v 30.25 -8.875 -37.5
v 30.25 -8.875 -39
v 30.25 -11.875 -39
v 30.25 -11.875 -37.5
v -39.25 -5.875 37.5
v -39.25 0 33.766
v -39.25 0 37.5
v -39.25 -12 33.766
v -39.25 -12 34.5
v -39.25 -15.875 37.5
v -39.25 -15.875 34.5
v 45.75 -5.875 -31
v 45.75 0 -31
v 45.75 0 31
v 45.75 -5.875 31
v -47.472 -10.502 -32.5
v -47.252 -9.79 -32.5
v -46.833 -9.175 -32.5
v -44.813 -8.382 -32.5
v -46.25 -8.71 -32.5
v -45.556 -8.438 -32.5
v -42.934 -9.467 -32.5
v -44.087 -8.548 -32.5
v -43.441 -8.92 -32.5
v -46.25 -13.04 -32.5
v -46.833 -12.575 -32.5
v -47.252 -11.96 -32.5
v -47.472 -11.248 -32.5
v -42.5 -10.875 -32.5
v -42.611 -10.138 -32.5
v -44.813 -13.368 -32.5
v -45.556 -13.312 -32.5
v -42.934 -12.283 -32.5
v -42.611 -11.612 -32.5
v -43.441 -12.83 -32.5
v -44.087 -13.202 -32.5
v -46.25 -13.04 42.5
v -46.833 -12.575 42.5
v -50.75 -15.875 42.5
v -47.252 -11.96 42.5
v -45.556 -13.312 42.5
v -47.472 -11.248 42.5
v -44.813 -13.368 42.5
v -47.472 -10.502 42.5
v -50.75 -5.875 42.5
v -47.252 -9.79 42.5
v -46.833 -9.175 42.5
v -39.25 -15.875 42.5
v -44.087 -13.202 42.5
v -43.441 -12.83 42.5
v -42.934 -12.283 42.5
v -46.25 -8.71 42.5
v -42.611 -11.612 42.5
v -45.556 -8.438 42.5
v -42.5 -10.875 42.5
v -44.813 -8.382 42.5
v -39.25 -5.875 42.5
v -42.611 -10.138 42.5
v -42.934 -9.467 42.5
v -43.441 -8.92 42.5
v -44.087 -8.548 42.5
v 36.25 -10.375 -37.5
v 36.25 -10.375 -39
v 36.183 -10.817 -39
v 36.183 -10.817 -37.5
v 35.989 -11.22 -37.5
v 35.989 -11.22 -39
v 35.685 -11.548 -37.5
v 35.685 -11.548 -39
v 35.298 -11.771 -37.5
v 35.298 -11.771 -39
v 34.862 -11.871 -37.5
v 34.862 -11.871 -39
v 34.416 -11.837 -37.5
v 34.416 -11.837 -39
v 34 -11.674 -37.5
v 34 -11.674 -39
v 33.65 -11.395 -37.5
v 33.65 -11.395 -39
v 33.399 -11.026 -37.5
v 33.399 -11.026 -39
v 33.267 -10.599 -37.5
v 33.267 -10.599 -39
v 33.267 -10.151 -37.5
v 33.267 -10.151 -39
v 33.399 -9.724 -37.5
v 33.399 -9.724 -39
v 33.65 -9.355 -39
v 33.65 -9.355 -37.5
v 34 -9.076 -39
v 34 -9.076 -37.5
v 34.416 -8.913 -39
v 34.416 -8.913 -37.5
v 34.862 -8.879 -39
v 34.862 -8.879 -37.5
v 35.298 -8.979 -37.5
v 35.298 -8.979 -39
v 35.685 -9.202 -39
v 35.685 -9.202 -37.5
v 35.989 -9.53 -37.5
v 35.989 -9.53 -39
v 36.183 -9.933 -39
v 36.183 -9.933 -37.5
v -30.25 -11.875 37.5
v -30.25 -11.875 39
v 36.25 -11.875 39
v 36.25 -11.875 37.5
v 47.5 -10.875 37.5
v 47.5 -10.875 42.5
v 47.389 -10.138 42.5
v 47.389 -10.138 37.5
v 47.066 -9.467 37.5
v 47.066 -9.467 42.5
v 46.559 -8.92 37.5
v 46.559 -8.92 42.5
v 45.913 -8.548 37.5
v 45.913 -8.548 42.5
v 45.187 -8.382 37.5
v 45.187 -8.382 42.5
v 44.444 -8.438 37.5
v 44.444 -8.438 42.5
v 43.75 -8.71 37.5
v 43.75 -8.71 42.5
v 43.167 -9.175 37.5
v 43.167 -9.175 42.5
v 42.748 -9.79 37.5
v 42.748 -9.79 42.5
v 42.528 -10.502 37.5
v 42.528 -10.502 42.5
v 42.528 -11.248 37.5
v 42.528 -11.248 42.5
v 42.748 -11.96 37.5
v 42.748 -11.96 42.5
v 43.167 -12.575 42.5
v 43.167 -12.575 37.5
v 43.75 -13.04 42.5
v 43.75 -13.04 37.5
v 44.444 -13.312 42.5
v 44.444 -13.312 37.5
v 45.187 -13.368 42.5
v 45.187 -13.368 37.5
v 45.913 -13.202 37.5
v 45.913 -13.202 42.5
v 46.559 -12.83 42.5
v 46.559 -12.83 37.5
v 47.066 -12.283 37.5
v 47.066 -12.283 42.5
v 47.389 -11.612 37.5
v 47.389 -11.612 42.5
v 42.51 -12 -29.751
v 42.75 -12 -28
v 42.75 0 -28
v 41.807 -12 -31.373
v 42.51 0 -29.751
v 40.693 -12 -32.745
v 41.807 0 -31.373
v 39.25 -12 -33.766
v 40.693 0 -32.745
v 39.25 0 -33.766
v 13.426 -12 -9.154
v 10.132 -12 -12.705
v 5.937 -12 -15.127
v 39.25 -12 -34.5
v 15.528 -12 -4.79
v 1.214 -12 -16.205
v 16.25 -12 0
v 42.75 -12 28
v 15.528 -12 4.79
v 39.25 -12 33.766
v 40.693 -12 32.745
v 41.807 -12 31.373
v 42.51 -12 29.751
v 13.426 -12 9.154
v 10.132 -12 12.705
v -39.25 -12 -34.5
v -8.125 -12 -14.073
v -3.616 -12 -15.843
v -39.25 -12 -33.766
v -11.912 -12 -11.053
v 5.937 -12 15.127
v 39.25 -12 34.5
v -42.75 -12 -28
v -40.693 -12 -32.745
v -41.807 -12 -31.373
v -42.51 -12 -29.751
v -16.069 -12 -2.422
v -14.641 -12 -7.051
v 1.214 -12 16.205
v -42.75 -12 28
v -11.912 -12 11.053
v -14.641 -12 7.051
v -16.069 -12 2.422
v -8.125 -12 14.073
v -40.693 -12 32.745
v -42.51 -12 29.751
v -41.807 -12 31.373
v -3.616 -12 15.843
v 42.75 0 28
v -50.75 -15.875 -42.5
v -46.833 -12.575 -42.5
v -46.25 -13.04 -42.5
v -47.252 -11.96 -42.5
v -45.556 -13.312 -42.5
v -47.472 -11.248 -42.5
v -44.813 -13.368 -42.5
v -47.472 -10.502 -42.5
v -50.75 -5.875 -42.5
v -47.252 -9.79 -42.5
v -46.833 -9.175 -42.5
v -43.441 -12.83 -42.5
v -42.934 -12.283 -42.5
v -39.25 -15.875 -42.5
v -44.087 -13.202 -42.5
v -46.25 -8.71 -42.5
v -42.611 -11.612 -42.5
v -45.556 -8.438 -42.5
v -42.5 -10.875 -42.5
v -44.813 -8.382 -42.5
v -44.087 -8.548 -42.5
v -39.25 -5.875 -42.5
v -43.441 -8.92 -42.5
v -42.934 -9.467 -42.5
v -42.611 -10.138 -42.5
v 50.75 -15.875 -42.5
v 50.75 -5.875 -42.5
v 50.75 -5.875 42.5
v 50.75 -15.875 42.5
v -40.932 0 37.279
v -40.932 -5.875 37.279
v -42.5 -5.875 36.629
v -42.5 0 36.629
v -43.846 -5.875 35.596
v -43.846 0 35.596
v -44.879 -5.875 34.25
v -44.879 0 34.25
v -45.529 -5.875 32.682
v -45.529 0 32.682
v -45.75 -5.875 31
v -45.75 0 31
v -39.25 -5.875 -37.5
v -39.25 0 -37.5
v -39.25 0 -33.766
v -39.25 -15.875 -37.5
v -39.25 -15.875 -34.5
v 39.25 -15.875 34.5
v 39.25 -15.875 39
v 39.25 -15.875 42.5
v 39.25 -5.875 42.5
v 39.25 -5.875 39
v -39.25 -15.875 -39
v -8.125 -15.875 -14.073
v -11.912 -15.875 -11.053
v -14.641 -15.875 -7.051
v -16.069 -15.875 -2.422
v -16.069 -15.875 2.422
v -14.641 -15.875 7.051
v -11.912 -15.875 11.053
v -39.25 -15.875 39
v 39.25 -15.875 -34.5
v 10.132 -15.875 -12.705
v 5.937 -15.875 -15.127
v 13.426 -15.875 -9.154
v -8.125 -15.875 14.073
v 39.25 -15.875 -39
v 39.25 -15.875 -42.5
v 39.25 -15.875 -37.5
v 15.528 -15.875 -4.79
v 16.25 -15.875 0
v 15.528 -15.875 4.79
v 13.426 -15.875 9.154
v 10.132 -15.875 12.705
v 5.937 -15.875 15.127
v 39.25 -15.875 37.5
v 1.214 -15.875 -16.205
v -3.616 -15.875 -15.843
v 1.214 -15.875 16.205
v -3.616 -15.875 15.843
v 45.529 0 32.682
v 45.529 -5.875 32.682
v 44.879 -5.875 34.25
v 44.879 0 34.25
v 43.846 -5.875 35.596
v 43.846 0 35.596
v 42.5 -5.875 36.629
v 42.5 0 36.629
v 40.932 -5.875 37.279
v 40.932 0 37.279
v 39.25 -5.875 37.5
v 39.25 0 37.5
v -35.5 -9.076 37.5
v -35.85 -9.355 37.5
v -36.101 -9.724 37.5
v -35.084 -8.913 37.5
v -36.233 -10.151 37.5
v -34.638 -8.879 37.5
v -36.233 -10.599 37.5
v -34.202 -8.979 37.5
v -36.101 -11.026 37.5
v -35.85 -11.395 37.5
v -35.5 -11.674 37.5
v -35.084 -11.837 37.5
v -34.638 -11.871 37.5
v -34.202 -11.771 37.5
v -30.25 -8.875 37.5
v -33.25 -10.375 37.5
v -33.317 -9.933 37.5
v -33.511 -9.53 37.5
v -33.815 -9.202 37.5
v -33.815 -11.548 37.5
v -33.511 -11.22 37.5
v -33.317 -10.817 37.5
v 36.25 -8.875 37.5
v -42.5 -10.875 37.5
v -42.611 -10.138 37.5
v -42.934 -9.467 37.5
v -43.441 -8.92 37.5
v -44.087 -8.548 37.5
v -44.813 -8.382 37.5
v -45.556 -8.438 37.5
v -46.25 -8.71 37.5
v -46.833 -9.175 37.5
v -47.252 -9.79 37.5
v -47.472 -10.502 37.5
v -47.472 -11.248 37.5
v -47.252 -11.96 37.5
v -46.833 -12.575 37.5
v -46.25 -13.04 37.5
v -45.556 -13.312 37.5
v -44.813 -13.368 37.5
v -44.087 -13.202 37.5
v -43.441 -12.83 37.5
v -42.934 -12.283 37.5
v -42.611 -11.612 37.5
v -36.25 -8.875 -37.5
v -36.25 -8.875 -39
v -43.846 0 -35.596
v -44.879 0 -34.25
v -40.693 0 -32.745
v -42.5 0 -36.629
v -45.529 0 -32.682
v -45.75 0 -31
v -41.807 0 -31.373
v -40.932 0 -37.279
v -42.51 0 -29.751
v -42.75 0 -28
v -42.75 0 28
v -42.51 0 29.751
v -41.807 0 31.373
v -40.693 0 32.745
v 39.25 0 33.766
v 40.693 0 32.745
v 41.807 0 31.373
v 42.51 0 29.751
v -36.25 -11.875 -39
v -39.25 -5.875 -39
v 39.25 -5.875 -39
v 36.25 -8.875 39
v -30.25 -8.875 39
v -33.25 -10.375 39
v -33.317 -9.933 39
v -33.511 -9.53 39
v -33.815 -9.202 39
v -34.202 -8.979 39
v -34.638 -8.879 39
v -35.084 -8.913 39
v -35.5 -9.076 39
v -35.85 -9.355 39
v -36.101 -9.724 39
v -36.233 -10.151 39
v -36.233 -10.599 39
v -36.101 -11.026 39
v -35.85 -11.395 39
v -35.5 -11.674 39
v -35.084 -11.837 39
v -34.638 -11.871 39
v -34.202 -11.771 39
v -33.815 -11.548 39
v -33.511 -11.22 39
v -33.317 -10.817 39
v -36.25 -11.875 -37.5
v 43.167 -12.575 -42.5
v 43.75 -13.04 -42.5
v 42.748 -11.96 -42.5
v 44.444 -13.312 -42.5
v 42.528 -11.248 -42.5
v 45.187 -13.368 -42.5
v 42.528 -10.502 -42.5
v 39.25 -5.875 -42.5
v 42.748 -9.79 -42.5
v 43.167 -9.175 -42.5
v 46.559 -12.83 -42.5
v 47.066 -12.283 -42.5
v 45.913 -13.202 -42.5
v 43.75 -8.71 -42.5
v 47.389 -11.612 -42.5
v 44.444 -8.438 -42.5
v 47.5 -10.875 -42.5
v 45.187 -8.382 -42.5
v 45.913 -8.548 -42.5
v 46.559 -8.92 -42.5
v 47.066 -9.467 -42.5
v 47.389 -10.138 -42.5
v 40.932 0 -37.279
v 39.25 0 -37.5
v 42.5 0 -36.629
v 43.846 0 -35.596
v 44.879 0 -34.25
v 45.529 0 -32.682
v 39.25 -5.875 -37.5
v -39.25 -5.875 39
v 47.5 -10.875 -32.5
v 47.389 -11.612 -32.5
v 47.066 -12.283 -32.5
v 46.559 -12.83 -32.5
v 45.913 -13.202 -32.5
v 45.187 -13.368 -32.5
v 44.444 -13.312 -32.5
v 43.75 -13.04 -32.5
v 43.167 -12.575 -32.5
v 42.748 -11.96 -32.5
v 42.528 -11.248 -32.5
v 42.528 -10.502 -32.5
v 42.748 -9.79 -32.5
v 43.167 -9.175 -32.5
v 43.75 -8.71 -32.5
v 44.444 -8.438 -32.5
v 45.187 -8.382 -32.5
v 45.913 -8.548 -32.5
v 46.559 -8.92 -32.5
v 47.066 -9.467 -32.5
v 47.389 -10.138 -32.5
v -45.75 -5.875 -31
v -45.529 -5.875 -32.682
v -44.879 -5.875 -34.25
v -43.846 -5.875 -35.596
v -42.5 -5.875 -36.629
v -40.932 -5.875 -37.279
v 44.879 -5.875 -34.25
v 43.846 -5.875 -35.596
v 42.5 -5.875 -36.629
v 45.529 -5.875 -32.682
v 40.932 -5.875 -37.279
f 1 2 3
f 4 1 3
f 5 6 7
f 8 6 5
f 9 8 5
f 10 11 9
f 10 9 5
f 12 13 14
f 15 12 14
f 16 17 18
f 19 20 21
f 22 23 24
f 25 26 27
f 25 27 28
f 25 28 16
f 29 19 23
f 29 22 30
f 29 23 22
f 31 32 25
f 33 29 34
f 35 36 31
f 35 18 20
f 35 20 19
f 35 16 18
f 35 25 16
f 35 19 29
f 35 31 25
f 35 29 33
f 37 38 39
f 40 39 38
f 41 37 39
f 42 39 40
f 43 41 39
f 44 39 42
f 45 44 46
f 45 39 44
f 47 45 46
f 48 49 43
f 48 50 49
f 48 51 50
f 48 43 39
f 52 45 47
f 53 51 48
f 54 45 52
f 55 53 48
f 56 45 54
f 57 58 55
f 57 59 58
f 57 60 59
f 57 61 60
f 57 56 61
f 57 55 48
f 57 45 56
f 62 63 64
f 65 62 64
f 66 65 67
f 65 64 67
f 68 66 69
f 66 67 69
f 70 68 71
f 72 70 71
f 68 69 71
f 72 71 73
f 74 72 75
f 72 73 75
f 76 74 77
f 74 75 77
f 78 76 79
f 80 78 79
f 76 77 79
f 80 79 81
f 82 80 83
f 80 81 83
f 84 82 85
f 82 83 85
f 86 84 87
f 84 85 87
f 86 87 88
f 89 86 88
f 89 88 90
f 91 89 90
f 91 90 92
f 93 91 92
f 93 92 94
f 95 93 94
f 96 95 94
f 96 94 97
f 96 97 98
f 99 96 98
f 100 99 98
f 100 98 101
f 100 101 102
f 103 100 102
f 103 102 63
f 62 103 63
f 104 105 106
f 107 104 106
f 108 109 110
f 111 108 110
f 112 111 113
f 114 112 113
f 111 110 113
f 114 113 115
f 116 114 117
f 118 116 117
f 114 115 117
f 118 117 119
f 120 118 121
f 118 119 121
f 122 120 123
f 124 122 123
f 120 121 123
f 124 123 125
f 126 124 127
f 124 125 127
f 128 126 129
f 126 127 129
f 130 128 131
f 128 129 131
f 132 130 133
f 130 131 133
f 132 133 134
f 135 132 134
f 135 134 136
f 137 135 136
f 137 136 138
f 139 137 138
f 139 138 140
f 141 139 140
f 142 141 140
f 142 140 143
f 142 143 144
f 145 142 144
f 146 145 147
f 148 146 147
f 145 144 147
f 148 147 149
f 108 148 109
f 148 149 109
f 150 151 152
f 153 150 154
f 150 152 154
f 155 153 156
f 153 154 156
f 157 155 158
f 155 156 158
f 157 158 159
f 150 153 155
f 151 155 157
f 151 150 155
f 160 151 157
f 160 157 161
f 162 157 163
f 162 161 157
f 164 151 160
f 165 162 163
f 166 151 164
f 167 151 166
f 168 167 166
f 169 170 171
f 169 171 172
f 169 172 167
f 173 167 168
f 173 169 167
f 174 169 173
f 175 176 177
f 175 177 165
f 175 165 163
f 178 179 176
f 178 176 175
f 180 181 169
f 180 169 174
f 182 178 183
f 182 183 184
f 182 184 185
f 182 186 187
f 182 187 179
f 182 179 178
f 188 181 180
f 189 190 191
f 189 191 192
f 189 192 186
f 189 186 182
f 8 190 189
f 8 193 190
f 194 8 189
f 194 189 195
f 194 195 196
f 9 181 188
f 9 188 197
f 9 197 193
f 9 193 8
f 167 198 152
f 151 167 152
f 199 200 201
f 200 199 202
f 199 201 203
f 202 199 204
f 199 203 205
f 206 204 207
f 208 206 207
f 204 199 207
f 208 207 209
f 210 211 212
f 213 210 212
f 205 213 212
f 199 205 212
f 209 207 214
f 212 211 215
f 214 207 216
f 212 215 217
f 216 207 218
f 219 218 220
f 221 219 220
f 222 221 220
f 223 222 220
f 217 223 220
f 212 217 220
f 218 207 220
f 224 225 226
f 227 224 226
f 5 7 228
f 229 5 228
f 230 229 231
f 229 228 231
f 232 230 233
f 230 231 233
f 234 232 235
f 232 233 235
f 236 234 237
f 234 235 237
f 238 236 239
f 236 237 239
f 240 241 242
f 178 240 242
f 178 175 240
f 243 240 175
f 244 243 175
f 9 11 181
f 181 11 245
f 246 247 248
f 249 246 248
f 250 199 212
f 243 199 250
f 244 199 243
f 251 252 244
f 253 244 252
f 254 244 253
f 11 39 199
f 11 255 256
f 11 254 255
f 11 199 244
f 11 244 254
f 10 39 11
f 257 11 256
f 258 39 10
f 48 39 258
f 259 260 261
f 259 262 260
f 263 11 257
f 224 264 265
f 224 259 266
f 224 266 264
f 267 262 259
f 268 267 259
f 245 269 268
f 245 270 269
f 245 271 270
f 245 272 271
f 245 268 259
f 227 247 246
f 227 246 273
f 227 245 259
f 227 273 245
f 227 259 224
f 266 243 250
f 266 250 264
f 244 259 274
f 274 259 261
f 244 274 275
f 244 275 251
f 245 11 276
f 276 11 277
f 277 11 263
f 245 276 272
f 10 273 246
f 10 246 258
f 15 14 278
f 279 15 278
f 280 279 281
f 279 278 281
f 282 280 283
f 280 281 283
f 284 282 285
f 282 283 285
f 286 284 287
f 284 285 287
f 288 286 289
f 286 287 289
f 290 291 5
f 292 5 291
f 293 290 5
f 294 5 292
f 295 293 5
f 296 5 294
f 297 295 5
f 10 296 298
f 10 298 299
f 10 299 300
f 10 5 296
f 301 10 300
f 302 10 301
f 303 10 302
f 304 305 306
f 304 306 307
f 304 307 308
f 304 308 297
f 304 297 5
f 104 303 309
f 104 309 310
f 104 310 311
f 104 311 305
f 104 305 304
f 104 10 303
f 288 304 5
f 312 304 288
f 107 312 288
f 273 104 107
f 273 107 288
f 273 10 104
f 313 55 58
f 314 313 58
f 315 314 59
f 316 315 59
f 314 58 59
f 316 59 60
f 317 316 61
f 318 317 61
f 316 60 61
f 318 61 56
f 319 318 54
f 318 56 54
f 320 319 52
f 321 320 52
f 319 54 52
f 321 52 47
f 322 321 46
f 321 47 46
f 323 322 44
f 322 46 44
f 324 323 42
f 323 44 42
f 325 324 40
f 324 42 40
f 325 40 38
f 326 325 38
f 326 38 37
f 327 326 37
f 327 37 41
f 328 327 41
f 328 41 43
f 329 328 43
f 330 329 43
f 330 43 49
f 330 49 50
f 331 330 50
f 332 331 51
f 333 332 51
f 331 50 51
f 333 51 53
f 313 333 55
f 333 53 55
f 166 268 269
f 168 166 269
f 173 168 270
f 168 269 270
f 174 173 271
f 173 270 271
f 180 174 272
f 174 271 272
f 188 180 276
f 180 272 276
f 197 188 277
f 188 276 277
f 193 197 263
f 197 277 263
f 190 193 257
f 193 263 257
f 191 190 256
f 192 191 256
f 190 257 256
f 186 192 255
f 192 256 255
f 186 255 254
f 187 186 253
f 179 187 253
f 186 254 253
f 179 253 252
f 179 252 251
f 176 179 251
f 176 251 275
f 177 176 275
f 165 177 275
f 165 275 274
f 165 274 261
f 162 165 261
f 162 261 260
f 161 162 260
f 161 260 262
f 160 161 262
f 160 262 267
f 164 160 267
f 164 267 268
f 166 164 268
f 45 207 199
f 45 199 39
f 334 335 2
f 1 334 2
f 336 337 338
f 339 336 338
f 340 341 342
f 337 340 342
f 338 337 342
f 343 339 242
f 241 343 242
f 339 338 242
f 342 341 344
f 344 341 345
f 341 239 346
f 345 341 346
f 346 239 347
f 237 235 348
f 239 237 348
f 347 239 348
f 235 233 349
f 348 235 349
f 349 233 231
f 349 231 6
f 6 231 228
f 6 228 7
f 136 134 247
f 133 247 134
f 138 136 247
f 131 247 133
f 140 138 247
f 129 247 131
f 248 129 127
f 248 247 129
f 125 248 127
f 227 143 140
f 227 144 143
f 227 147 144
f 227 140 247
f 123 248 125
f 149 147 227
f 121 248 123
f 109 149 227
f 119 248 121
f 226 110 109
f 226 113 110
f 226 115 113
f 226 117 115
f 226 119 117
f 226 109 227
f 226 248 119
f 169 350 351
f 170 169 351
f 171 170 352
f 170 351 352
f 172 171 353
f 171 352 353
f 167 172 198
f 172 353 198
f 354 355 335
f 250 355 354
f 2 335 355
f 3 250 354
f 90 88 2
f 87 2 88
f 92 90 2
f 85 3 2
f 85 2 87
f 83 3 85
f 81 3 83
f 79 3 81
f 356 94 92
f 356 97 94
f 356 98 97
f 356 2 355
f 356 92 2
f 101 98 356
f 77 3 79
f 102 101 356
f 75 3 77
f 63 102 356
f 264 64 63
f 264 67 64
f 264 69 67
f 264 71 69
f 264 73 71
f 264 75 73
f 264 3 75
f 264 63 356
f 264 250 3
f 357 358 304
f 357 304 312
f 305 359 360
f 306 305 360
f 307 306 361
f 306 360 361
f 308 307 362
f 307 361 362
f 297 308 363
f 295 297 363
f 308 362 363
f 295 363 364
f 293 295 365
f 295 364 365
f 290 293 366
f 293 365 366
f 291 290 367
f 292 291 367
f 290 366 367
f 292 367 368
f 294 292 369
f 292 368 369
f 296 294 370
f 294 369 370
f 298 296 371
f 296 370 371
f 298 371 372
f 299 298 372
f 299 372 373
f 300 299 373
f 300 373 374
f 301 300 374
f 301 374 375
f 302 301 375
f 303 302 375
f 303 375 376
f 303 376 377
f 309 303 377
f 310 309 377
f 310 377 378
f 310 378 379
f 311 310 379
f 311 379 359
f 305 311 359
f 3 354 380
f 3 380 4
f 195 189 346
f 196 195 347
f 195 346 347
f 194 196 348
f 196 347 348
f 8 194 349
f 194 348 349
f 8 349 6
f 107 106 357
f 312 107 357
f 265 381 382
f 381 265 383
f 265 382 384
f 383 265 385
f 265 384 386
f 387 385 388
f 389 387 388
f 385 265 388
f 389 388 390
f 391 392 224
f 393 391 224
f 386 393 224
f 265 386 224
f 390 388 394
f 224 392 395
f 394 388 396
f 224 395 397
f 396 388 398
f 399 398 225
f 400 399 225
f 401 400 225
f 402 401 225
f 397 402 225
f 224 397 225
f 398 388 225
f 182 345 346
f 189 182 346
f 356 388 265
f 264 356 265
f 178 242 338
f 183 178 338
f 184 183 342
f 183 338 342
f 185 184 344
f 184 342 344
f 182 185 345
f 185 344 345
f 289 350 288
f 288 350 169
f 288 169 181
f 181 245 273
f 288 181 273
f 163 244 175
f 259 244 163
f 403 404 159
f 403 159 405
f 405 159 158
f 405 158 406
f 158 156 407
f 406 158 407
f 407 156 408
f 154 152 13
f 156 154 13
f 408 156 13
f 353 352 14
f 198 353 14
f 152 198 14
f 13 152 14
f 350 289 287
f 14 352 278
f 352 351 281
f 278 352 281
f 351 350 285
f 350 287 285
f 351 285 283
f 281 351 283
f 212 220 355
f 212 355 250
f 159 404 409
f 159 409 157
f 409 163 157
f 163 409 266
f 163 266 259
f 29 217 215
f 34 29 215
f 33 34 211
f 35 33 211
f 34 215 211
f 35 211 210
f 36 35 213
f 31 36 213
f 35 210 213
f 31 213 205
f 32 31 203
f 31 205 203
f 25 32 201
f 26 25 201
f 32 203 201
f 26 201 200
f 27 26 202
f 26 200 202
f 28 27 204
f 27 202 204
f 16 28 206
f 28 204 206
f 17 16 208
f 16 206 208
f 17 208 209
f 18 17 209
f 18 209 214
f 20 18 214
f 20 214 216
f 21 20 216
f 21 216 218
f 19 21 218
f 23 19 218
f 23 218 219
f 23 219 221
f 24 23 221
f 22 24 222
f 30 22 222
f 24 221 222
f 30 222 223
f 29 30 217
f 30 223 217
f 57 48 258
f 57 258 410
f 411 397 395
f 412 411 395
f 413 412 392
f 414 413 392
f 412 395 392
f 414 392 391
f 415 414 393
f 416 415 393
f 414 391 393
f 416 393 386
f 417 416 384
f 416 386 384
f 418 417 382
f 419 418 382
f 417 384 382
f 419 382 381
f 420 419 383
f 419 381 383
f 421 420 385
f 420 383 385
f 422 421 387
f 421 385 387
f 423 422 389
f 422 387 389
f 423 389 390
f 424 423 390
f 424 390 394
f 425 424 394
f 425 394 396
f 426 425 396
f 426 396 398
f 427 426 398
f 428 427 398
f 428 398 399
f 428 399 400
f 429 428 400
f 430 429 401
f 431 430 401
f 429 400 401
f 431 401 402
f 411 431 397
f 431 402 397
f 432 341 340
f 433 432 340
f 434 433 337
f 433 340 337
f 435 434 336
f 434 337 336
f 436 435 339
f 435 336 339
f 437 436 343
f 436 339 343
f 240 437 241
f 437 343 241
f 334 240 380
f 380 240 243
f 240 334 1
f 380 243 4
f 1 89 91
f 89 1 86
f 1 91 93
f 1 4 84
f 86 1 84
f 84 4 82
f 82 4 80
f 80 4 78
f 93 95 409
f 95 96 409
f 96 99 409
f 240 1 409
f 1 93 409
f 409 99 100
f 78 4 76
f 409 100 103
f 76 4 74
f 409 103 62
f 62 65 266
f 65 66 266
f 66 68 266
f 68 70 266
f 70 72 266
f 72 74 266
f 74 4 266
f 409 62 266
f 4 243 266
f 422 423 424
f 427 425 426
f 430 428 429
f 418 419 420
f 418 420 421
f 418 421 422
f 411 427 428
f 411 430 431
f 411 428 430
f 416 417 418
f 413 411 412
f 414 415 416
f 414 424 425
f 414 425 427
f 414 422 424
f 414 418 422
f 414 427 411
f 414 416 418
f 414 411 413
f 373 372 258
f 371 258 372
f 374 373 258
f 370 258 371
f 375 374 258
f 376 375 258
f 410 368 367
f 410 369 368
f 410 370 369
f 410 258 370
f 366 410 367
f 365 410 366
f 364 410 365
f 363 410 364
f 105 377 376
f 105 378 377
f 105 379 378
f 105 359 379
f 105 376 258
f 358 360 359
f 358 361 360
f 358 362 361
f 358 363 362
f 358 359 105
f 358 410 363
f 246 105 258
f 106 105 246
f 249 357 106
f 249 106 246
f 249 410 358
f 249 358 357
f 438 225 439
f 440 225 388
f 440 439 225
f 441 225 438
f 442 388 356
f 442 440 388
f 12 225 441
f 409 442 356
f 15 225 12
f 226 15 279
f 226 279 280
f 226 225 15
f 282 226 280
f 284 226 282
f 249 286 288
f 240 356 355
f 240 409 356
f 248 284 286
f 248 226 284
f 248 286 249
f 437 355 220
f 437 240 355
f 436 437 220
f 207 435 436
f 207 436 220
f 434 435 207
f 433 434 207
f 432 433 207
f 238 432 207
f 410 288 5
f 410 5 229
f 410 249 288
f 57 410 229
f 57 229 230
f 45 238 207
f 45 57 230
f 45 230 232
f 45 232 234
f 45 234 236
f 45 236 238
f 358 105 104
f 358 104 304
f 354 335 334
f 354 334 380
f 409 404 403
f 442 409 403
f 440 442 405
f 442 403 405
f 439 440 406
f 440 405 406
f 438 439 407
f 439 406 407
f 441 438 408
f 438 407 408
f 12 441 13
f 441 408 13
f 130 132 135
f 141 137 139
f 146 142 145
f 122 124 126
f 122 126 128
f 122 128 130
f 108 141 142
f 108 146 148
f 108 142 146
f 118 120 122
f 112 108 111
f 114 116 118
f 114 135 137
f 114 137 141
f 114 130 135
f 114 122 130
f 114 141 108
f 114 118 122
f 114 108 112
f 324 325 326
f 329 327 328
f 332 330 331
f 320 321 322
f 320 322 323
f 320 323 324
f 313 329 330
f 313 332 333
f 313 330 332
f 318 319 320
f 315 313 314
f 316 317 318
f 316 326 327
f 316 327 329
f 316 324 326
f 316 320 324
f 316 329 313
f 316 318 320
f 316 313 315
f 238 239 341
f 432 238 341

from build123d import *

# Parameters (mm, degrees)
F0_W      = 101.5
F0_H      = 85
F1_DEPTH  = 15.875
F2_R      = 16.25
F3_DEPTH  = 25
F4_W      = 101.5
F4_H      = 85
F5_DEPTH  = 5.875
F7_DEPTH  = 12
F8_W      = 78.5
F8_H      = 10
F9_DEPTH  = 3.5
F10_W     = 78.5
F10_H     = 10
F11_DEPTH = 3.5
F12_W     = 78.5
F12_H     = 3
F13_DEPTH = 25
F14_W     = 78.5
F14_H     = 17.569206
F15_DEPTH = 200
F16_W     = 78.5
F16_H     = 75
F17_DEPTH = 6.125
F18_R     = 1.5
F18_W     = 66.5
F18_H     = 3
F19_DEPTH = 2
F20_R     = 1.5
F20_W     = 66.5
F20_H     = 3
F21_DEPTH = 2
F22_R     = 2.5
F23_DEPTH = 10
F24_R     = 2.5
F25_DEPTH = 10
F26_R     = 2.5
F27_DEPTH = 5
F28_R     = 2.5
F29_DEPTH = 5


with BuildPart() as f1:
    # F0 (on Front) → F1 (new body)
    with BuildSketch(Plane.XZ):
        Rectangle(F0_W, F0_H)
    extrude(amount=F1_DEPTH)

    # F2 (on face) → F3 (cut)
    with BuildSketch(Plane.XZ.offset(15.875)):
        Circle(F2_R)
    extrude(amount=-F3_DEPTH, mode=Mode.SUBTRACT)

    # F4 (on face) → F5 (cut)
    with BuildSketch(Plane(origin=(0, 0, 0), x_dir=(-1, 0, 0), z_dir=(0, 1, 0))):
        Rectangle(F4_W, F4_H)
        with BuildLine():
            Line((-45.75, -31), (-45.75, 31))
            ThreePointArc((-45.75, 31), (-43.846194, 35.596194), (-39.25, 37.5))
            Line((-39.25, 37.5), (39.25, 37.5))
            ThreePointArc((39.25, 37.5), (43.846194, 35.596194), (45.75, 31))
            Line((45.75, 31), (45.75, -31))
            ThreePointArc((45.75, -31), (43.846194, -35.596194), (39.25, -37.5))
            Line((39.25, -37.5), (-39.25, -37.5))
            ThreePointArc((-39.25, -37.5), (-43.846194, -35.596194), (-45.75, -31))
        make_face(mode=Mode.SUBTRACT)
    extrude(amount=-F5_DEPTH, mode=Mode.SUBTRACT)

    # F6 (on face) → F7 (cut)
    with BuildSketch(Plane(origin=(0, 0, 0), x_dir=(-1, 0, 0), z_dir=(0, 1, 0))):
        with BuildLine():
            ThreePointArc((-36.25, 34.5), (-40.846194, 32.596194), (-42.75, 28))
            Line((-42.75, 28), (-42.75, -28))
            ThreePointArc((-42.75, -28), (-40.846194, -32.596194), (-36.25, -34.5))
            Line((-36.25, -34.5), (36.25, -34.5))
            ThreePointArc((36.25, -34.5), (40.846194, -32.596194), (42.75, -28))
            Line((42.75, -28), (42.75, 28))
            ThreePointArc((42.75, 28), (40.846194, 32.596194), (36.25, 34.5))
            Line((36.25, 34.5), (-36.25, 34.5))
        make_face()
    extrude(amount=-F7_DEPTH, mode=Mode.SUBTRACT)

    # F8 (on face) → F9 (cut)
    with BuildSketch(Plane.XY.offset(42.5)):
        with Locations((0, -10.875)):
            Rectangle(F8_W, F8_H)
    extrude(amount=-F9_DEPTH, mode=Mode.SUBTRACT)

    # F10 (on face) → F11 (cut)
    with BuildSketch(Plane(origin=(0, 0, -42.5), x_dir=(1, 0, 0), z_dir=(0, 0, -1))):
        with Locations((0, 10.875)):
            Rectangle(F10_W, F10_H)
    extrude(amount=-F11_DEPTH, mode=Mode.SUBTRACT)

    # F12 (on face) → F13 (cut)
    with BuildSketch(Plane.XZ.offset(15.875)):
        with Locations((0, 36)):
            Rectangle(F12_W, F12_H)
        with Locations((0, -36)):
            Rectangle(F12_W, F12_H)
    extrude(amount=-F13_DEPTH, mode=Mode.SUBTRACT)

    # F14 (on face) → F15 (cut)
    with BuildSketch(Plane.XY.offset(39)):
        with Locations((0, 2.909603)):
            Rectangle(F14_W, F14_H)
    extrude(amount=-F15_DEPTH, mode=Mode.SUBTRACT)

    # F16 (on face) → F17 (cut)
    with BuildSketch(Plane(origin=(0, -5.875, 0), x_dir=(-1, 0, 0), z_dir=(0, 1, 0))):
        Rectangle(F16_W, F16_H)
    extrude(amount=-F17_DEPTH, mode=Mode.SUBTRACT)

    # F18 (on face) → F19 (cut)
    with BuildSketch(Plane.XY.offset(39)):
        with Locations((-34.75, -10.375)):
            Circle(F18_R)
        with Locations((3, -10.375)):
            Rectangle(F18_W, F18_H)
    extrude(amount=-F19_DEPTH, mode=Mode.SUBTRACT)

    # F20 (on face) → F21 (cut)
    with BuildSketch(Plane(origin=(0, 0, -39), x_dir=(1, 0, 0), z_dir=(0, 0, -1))):
        with Locations((34.75, 10.375)):
            Circle(F20_R)
        with Locations((-3, 10.375)):
            Rectangle(F20_W, F20_H)
    extrude(amount=-F21_DEPTH, mode=Mode.SUBTRACT)

    # F22 (on face) → F23 (cut)
    with BuildSketch(Plane(origin=(0, 0, -42.5), x_dir=(1, 0, 0), z_dir=(0, 0, -1))):
        with Locations((-45, 10.875)):
            Circle(F22_R)
    extrude(amount=-F23_DEPTH, mode=Mode.SUBTRACT)

    # F24 (on face) → F25 (cut)
    with BuildSketch(Plane(origin=(0, 0, -42.5), x_dir=(1, 0, 0), z_dir=(0, 0, -1))):
        with Locations((45, 10.875)):
            Circle(F24_R)
    extrude(amount=-F25_DEPTH, mode=Mode.SUBTRACT)

    # F26 (on face) → F27 (cut)
    with BuildSketch(Plane.XY.offset(42.5)):
        with Locations((-45, -10.875)):
            Circle(F26_R)
    extrude(amount=-F27_DEPTH, mode=Mode.SUBTRACT)

    # F28 (on face) → F29 (cut)
    with BuildSketch(Plane.XY.offset(42.5)):
        with Locations((45, -10.875)):
            Circle(F28_R)
    extrude(amount=-F29_DEPTH, mode=Mode.SUBTRACT)


solid = f1.part
